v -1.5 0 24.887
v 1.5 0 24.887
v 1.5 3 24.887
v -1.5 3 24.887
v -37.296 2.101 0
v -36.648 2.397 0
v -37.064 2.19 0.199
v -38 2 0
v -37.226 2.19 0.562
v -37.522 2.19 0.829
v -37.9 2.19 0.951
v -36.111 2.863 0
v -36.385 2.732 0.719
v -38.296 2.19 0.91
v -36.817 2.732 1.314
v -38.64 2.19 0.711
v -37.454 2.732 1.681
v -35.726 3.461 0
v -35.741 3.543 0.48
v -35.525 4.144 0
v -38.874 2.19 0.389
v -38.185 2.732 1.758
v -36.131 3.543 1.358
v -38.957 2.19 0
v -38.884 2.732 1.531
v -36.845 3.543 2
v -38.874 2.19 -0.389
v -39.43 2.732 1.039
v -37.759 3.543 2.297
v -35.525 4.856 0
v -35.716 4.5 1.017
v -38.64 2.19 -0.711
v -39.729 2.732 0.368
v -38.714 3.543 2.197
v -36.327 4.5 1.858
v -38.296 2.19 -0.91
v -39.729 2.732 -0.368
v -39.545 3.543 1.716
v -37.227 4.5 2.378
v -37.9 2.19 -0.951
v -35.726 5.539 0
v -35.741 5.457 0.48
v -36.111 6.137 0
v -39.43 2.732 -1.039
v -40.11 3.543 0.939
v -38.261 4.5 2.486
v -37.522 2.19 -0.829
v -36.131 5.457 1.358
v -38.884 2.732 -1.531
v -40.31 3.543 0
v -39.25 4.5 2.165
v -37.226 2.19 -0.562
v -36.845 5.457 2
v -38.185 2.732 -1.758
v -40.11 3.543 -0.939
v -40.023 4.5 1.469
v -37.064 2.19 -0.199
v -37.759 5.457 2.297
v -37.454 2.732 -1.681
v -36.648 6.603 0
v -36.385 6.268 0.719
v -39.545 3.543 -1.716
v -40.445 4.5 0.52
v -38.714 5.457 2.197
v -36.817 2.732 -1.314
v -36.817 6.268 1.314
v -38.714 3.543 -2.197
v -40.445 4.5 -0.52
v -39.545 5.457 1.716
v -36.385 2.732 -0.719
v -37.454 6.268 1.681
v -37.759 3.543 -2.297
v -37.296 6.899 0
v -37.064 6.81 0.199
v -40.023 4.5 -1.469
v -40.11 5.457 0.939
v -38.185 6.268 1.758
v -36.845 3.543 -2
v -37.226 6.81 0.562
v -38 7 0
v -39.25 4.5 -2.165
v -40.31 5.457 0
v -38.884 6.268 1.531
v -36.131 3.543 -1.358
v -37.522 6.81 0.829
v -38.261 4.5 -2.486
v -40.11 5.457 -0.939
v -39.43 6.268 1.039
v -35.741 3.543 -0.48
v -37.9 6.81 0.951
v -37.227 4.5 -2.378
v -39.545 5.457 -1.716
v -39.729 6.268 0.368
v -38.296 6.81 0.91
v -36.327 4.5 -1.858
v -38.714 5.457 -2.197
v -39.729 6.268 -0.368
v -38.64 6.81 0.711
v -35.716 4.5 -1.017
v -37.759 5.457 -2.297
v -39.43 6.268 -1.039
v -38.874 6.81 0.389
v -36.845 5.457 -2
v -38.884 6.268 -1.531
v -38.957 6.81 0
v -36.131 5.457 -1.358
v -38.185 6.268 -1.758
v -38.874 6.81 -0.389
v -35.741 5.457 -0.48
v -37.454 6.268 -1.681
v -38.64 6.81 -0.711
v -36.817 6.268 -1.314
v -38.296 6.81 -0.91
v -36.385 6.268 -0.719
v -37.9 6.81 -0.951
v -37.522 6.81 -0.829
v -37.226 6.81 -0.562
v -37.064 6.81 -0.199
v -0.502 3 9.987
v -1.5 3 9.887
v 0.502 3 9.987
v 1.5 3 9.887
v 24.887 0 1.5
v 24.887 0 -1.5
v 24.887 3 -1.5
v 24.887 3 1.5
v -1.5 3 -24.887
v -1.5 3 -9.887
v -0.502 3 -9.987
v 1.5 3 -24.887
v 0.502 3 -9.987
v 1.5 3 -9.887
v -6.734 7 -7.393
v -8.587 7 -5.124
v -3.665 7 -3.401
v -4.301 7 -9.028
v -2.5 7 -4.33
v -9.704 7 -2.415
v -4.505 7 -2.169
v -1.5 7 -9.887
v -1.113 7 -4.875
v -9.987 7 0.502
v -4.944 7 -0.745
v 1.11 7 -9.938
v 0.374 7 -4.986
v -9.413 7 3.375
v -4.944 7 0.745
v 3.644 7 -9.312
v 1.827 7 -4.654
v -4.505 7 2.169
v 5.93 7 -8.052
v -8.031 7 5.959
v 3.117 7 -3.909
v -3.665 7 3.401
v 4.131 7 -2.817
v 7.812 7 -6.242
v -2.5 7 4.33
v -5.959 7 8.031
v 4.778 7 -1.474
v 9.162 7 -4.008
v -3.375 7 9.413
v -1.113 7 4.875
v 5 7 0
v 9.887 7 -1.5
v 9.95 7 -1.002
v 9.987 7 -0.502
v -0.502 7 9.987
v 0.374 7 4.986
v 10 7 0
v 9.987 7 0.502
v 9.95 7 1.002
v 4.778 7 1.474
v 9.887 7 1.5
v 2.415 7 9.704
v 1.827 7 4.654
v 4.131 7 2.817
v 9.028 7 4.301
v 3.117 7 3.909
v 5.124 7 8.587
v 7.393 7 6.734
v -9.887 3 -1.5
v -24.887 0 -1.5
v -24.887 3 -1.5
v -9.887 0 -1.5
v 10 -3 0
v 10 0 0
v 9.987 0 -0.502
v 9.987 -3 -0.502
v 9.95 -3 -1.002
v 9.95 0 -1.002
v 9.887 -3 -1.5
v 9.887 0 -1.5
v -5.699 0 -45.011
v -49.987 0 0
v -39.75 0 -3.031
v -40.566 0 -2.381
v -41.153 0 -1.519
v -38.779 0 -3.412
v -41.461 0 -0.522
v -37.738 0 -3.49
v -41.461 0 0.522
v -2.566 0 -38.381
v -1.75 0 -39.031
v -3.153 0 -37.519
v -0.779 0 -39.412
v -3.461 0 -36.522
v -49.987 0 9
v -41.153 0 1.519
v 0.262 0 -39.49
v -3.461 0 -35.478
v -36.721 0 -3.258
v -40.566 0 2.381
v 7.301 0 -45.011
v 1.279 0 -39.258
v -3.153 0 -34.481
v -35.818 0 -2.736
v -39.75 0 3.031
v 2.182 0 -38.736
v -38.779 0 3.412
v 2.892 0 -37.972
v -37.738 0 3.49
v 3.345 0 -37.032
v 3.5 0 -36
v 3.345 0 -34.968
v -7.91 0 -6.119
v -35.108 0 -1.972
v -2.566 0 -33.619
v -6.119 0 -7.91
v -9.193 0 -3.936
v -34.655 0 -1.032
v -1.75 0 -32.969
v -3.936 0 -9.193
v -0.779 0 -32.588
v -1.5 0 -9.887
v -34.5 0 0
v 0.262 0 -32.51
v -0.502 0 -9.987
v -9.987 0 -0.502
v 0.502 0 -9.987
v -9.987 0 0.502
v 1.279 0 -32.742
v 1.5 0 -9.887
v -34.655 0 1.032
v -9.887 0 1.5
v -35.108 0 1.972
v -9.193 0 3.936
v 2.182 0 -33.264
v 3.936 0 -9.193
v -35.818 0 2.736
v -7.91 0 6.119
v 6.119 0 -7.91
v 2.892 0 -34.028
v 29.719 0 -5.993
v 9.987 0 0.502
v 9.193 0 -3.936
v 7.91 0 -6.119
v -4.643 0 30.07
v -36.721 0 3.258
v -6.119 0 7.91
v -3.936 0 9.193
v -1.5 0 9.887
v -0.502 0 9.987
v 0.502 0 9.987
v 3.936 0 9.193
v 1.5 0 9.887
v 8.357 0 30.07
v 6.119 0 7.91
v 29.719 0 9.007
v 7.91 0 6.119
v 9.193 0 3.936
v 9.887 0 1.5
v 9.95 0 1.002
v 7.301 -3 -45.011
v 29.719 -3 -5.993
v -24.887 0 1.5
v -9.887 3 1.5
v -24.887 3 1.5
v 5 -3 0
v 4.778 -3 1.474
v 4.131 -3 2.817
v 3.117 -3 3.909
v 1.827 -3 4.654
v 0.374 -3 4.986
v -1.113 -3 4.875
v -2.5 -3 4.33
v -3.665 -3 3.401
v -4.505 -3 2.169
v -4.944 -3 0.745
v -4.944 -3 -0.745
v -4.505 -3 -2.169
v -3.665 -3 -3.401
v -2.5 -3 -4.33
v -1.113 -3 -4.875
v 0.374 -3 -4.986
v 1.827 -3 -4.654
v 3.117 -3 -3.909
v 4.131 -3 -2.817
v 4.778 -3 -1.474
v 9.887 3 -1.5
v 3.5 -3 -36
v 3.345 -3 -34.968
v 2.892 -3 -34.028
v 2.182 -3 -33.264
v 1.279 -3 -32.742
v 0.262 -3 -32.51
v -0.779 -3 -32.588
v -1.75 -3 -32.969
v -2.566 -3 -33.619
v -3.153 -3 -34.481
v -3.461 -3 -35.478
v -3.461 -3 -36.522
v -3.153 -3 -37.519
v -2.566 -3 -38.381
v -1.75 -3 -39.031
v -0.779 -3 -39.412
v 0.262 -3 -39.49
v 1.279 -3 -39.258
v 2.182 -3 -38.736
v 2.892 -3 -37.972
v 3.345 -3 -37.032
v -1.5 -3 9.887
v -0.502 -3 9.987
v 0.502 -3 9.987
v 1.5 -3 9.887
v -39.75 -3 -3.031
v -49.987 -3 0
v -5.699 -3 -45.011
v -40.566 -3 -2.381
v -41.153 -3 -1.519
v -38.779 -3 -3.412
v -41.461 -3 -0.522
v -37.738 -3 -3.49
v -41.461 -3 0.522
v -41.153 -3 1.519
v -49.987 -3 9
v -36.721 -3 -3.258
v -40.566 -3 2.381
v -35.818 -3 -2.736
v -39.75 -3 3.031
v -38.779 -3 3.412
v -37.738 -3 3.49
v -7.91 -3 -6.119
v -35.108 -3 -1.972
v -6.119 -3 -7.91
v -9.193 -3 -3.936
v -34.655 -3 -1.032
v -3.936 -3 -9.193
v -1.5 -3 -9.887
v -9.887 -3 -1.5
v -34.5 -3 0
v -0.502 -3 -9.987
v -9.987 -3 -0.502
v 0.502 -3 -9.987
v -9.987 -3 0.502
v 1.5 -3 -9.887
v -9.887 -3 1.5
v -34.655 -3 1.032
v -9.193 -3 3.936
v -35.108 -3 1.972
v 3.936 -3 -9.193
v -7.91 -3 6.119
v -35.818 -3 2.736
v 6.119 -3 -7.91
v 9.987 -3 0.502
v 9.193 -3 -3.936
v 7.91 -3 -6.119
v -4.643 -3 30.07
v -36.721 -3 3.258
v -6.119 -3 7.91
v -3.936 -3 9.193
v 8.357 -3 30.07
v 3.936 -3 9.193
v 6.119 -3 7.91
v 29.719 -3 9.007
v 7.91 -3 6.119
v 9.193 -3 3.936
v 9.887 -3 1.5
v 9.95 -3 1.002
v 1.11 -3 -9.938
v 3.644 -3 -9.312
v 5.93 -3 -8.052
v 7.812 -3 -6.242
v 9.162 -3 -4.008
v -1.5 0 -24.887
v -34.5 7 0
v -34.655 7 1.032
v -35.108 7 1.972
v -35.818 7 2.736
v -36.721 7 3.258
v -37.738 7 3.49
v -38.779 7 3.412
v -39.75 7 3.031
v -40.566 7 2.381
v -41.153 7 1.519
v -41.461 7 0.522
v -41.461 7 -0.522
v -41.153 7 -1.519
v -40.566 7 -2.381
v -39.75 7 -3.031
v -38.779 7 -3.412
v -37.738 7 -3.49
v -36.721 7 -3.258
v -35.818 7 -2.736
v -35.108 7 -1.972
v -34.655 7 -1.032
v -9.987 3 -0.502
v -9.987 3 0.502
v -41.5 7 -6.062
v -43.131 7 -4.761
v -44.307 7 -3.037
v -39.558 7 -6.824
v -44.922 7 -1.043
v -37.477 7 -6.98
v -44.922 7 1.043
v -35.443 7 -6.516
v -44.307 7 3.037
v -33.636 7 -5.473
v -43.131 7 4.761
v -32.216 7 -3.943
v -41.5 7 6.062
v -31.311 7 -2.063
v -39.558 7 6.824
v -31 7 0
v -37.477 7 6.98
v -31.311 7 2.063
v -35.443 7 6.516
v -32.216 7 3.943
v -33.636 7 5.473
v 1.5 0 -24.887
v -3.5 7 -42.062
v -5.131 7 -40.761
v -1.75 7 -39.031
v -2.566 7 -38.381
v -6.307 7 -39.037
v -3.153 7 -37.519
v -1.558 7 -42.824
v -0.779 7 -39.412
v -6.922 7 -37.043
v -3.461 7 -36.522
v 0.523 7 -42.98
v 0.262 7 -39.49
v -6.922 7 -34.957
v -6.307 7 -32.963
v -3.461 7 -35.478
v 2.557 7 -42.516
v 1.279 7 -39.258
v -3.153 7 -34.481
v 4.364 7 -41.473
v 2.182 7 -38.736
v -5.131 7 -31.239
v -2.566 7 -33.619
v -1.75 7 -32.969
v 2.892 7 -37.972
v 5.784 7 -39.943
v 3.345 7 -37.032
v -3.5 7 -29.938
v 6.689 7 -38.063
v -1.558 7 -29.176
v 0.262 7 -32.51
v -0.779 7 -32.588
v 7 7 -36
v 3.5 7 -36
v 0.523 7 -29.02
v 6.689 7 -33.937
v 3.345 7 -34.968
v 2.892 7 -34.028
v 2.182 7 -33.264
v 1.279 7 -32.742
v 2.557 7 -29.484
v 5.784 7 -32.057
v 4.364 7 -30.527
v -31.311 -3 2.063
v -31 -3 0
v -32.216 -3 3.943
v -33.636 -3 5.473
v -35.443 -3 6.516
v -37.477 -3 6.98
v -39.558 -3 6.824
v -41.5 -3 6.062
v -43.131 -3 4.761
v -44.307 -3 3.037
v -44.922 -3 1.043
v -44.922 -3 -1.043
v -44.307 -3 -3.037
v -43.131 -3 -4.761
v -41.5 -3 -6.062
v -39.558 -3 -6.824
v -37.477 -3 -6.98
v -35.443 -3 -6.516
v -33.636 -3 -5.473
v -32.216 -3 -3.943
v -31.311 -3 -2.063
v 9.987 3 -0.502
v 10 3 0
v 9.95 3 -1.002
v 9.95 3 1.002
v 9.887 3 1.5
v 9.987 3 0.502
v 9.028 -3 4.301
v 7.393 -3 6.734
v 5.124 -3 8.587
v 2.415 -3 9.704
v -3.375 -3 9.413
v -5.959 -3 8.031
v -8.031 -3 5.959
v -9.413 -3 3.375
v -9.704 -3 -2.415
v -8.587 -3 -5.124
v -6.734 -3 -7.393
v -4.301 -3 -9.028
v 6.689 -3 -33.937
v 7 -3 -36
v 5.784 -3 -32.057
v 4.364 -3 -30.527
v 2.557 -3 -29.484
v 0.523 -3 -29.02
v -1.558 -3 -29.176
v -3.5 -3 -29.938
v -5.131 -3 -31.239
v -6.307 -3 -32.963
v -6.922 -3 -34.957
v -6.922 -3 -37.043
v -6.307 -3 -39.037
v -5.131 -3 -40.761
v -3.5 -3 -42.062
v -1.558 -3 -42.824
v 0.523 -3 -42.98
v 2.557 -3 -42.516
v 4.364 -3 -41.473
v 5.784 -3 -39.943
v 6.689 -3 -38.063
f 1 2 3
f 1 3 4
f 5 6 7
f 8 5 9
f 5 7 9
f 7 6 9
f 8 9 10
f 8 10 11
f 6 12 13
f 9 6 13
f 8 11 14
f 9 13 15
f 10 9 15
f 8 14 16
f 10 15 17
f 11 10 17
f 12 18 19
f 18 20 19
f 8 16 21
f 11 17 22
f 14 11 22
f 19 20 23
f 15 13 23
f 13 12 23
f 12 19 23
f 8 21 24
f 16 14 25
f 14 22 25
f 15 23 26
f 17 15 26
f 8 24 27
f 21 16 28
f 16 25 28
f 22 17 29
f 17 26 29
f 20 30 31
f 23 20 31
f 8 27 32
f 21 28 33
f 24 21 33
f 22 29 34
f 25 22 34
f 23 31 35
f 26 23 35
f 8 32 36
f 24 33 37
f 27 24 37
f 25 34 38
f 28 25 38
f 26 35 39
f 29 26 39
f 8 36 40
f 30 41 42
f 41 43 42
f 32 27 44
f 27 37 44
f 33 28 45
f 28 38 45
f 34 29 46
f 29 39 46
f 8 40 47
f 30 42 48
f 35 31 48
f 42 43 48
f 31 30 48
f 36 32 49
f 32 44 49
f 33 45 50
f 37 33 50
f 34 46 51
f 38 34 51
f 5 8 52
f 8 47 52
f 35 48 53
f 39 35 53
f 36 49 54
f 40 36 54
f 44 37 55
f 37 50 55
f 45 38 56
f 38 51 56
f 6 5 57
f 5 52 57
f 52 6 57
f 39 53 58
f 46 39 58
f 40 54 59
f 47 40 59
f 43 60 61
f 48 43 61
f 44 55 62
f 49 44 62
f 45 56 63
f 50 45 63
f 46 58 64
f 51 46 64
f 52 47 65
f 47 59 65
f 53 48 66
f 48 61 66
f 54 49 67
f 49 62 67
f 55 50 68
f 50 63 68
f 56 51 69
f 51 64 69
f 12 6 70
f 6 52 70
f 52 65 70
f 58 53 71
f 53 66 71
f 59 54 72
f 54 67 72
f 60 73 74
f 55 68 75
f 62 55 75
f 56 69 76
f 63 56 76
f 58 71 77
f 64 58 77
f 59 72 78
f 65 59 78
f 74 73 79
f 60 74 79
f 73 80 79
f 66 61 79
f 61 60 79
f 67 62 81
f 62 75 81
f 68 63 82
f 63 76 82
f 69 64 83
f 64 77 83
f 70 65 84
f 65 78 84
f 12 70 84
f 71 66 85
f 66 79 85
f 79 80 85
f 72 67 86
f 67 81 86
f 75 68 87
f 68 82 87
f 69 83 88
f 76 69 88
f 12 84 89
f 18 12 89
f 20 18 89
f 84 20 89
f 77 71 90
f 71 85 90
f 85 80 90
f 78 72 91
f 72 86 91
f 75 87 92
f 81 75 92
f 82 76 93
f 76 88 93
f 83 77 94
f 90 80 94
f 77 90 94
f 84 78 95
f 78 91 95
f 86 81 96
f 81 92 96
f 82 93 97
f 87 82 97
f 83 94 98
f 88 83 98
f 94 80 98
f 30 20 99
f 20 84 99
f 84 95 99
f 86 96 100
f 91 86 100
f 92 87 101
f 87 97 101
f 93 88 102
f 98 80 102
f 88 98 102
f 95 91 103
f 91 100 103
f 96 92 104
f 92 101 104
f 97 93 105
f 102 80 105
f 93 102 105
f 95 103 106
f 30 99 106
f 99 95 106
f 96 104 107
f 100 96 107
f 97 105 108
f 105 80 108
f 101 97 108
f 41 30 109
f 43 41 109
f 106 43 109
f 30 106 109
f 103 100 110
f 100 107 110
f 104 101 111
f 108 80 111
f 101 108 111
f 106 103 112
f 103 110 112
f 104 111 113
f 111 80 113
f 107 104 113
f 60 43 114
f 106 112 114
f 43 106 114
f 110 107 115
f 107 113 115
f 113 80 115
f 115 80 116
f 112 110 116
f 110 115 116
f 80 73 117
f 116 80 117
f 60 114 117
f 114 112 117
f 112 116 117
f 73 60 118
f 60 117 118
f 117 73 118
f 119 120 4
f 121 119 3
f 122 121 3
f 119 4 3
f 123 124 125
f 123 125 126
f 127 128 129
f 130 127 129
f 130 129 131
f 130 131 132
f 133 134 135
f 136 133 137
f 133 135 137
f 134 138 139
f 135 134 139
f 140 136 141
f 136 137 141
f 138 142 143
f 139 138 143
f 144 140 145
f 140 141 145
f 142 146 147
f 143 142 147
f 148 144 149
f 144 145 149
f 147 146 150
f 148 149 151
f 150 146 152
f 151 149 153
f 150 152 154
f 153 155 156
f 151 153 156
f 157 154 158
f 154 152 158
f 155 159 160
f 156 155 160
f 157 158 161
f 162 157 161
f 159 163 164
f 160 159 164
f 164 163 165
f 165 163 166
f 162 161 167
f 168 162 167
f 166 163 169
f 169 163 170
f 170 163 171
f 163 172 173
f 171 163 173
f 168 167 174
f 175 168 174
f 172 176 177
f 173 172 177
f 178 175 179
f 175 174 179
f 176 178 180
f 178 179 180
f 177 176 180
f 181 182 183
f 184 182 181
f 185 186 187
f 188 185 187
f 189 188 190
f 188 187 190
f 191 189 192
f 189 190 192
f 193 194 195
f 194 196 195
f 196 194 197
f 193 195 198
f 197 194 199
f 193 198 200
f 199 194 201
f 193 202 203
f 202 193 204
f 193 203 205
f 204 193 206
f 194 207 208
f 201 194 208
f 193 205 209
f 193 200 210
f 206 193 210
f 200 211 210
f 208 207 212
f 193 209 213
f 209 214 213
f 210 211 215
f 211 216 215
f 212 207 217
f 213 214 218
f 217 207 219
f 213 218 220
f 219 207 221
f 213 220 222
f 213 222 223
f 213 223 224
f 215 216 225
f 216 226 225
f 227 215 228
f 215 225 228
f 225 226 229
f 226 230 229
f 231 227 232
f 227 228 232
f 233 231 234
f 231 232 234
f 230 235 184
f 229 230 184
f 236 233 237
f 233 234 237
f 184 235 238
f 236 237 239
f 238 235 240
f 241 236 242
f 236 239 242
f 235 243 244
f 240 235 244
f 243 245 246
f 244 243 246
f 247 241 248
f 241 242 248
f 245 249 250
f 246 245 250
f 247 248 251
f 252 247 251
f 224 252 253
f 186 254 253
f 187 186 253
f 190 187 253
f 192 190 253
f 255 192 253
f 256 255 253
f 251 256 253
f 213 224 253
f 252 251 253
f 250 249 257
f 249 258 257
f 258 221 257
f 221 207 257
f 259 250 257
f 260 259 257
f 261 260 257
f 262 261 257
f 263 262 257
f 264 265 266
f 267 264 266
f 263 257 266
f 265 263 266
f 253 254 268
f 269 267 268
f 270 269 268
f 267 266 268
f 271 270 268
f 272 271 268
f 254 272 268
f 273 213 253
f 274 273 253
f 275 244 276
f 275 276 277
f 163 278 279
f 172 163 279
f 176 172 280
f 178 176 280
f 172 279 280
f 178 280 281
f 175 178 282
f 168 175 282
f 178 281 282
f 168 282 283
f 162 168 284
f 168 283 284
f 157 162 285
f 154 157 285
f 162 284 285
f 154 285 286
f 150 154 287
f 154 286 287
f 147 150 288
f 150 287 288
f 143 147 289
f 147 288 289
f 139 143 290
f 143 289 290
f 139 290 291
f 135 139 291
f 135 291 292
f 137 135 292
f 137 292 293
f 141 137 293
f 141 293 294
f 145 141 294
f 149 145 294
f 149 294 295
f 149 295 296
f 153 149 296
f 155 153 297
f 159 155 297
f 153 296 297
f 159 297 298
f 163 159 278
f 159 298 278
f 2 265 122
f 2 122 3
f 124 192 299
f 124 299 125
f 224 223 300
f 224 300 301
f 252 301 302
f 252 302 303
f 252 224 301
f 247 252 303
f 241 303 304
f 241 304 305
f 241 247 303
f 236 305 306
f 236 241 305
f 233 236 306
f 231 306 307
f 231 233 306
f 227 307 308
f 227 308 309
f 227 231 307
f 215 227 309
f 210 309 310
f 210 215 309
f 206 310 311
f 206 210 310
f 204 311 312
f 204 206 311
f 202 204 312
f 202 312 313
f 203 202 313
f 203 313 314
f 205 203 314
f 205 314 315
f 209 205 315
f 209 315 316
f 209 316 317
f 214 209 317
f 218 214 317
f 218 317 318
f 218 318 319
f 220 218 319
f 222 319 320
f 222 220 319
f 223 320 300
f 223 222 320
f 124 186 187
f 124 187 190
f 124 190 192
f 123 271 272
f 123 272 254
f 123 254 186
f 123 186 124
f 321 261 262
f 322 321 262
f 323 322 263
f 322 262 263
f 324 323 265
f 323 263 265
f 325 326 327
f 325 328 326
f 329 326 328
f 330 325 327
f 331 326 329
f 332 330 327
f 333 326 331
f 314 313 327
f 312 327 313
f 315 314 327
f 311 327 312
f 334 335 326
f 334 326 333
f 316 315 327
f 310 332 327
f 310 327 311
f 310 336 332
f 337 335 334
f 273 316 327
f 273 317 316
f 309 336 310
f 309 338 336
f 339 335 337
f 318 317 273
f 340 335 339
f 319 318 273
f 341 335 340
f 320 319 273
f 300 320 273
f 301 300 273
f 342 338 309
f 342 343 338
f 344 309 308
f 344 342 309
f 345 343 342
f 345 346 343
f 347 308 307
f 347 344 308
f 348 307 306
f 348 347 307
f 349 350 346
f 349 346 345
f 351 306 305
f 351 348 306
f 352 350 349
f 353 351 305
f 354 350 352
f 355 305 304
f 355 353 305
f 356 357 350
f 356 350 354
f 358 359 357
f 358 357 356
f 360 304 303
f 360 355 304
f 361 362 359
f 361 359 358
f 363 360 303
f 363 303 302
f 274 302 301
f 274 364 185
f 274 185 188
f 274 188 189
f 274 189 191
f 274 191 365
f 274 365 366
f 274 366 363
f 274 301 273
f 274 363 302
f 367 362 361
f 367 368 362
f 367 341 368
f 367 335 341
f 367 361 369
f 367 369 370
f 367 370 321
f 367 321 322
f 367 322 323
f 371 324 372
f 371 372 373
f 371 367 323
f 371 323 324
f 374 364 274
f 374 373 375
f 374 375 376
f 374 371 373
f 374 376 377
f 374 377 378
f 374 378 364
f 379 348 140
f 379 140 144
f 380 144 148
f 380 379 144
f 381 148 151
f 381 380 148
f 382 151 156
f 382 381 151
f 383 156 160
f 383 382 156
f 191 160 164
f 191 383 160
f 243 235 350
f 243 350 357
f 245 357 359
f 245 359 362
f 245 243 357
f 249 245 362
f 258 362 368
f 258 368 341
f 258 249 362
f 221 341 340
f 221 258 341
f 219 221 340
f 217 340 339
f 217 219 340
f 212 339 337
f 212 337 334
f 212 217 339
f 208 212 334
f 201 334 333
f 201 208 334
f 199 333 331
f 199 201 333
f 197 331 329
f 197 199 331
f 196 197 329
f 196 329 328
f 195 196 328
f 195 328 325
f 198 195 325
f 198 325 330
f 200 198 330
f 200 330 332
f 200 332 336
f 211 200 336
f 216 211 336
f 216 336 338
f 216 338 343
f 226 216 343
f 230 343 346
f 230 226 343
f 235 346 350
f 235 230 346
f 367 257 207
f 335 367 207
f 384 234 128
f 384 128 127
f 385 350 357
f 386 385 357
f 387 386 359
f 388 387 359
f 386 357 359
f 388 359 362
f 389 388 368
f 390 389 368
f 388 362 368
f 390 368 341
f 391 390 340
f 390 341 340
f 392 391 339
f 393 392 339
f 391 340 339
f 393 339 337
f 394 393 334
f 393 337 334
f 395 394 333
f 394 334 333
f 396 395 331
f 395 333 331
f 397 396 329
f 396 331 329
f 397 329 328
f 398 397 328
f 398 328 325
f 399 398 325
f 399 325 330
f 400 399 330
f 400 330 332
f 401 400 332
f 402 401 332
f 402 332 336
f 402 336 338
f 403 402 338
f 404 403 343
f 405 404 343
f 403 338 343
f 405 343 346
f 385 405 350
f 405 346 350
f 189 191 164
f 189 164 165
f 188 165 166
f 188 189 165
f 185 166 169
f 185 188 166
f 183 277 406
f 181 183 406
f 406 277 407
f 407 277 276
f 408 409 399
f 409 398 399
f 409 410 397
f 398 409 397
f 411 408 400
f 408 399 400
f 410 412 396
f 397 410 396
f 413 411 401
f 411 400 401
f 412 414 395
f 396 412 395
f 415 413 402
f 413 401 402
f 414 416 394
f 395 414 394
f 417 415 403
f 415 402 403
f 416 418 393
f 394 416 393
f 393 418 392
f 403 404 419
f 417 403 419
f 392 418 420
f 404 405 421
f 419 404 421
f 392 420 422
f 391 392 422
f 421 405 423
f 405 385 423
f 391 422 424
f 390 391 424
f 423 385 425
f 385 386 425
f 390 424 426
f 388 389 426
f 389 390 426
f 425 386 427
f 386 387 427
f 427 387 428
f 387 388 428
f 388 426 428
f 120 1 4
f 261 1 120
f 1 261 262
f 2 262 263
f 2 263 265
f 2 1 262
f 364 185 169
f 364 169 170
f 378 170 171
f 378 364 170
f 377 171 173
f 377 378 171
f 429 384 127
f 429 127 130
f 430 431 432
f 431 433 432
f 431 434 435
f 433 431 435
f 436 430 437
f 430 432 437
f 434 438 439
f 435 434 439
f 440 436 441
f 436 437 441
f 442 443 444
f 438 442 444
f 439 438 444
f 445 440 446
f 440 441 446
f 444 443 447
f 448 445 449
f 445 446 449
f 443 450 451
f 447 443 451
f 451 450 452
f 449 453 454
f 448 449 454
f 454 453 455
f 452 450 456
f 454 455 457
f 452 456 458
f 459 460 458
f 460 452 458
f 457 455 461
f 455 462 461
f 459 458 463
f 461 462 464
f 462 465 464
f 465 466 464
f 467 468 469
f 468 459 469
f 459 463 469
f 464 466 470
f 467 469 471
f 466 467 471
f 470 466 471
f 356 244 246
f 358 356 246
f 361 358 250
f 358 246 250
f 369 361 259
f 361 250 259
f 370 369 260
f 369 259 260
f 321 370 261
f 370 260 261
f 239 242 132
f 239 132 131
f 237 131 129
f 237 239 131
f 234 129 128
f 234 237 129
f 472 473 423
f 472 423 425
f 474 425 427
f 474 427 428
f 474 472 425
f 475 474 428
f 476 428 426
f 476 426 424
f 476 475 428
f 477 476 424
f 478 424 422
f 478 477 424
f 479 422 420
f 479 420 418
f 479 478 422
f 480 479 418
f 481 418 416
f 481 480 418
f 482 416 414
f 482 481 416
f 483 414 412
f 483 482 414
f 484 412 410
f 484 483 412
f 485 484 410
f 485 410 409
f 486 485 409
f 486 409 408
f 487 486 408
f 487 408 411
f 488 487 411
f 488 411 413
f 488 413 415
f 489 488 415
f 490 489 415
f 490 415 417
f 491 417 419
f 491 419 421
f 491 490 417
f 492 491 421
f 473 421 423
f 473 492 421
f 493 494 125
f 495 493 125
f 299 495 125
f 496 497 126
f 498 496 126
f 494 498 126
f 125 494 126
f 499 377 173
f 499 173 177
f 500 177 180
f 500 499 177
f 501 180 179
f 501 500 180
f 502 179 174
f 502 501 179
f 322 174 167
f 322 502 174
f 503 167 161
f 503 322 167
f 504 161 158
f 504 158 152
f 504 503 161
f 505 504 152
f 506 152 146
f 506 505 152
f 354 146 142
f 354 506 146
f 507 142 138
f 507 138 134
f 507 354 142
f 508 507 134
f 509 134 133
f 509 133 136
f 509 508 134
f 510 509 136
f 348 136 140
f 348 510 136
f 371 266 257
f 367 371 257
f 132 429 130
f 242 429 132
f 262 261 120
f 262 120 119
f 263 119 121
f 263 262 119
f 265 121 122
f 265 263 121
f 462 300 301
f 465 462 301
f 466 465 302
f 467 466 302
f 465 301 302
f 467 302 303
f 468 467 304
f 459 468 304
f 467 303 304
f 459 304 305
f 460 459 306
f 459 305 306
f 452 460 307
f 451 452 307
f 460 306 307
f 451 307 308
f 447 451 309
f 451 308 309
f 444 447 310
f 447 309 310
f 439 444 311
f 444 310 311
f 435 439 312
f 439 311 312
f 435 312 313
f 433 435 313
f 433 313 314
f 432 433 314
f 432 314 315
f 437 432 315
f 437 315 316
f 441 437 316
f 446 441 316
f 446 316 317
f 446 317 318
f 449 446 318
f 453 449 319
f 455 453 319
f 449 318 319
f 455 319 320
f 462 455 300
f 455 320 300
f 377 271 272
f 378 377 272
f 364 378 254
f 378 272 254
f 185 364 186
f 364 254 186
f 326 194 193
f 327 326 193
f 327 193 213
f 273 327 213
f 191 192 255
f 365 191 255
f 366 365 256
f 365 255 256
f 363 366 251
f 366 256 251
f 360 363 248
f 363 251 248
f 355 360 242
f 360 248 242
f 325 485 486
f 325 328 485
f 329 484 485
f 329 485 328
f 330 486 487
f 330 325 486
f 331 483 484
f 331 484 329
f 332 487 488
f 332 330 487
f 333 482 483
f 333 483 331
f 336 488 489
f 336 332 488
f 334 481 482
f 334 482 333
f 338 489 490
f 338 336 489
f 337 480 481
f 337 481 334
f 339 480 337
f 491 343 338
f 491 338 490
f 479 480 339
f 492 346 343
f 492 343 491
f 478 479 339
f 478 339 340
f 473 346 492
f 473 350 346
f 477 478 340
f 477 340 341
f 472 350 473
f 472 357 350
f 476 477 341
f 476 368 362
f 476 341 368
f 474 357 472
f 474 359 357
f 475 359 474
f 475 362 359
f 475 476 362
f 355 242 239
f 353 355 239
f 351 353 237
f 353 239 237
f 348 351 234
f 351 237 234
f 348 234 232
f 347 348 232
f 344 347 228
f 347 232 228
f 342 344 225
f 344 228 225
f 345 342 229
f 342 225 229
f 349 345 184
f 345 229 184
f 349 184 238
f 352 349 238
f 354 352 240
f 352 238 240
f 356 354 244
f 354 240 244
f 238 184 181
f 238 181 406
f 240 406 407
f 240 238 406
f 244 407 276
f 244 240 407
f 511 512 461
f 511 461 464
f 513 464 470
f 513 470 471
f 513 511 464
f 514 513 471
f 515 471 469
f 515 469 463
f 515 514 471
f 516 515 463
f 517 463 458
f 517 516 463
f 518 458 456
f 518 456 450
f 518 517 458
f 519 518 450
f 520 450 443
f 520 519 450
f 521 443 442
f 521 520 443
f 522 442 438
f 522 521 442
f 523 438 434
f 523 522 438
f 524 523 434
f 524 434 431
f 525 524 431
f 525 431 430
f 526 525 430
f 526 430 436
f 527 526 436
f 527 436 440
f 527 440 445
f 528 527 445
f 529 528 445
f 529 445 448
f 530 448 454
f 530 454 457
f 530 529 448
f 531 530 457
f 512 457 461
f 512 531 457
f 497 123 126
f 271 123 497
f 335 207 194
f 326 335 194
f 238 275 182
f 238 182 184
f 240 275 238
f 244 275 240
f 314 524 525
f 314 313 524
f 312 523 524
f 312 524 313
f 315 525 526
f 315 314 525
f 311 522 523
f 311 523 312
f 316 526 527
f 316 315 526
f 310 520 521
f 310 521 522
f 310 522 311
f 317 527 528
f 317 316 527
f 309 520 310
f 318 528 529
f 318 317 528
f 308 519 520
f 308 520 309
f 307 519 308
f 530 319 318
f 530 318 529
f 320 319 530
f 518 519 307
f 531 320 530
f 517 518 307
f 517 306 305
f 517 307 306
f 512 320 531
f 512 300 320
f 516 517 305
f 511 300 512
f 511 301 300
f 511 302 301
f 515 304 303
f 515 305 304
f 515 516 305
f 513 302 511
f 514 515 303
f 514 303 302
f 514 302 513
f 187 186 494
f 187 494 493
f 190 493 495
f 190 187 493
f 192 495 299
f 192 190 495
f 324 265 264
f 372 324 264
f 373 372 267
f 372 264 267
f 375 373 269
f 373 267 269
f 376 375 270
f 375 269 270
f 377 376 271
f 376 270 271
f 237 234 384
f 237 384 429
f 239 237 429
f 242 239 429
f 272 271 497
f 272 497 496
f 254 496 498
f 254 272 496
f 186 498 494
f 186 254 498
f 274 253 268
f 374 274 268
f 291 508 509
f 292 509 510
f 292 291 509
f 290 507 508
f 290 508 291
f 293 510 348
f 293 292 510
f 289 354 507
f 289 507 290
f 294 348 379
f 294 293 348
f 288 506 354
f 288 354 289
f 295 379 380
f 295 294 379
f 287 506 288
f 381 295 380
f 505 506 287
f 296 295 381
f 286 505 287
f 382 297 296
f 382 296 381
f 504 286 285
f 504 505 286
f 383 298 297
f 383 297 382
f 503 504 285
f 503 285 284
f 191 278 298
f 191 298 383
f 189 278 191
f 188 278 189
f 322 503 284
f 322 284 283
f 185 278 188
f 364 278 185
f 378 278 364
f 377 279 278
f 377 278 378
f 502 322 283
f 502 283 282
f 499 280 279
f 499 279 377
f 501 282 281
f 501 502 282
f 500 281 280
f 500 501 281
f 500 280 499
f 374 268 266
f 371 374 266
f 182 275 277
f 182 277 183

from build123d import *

# Parameters (mm, degrees)
F1_DEPTH = 3
F0_R     = 3.5
F2_DEPTH = 3
F3_R     = 5
F3_R_2   = 7
F3_R_3   = 3.5
F4_DEPTH = 10


with BuildPart() as f1:
    # F0 (on Front) → F1 (new body)
    with BuildSketch(Plane.XZ):
        with BuildLine():
            ThreePointArc((-9.88686, -1.5), (-10, 0), (-9.88686, 1.5))
            Line((-9.88686, 1.5), (-24.88686, 1.5))
            Line((-24.88686, 1.5), (-24.88686, -1.5))
            Line((-24.88686, -1.5), (-9.88686, -1.5))
        make_face()
        with BuildLine():
            ThreePointArc((-1.5, 9.88686), (0, 10), (1.5, 9.88686))
            Line((1.5, 9.88686), (1.5, 24.88686))
            Line((1.5, 24.88686), (-1.5, 24.88686))
            Line((-1.5, 24.88686), (-1.5, 9.88686))
        make_face()
        with BuildLine():
            ThreePointArc((9.88686, 1.5), (9.971675, 0.75213), (10, 0))
            ThreePointArc((10, 0), (9.971675, -0.75213), (9.88686, -1.5))
            Line((9.88686, -1.5), (24.88686, -1.5))
            Line((24.88686, -1.5), (24.88686, 1.5))
            Line((24.88686, 1.5), (9.88686, 1.5))
        make_face()
        with BuildLine():
            Line((1.5, -24.88686), (1.5, -9.88686))
            ThreePointArc((1.5, -9.88686), (0, -10), (-1.5, -9.88686))
            Line((-1.5, -9.88686), (-1.5, -24.88686))
            Line((-1.5, -24.88686), (1.5, -24.88686))
        make_face()
    extrude(amount=-F1_DEPTH)


with BuildPart() as f2:
    # F0 (on Front) → F2 (new body)
    with BuildSketch(Plane.XZ):
        Polygon((-49.986798, 9), (-49.986798, 0), (-5.699021, -45.011338), (7.300979, -45.011338), (29.718812, -5.99287), (29.718812, 2.802204), (29.718812, 9.00713), (8.356749, 30.070422), (-4.643251, 30.070422), align=None)
        with Locations((0, -36)):
            Circle(F0_R, mode=Mode.SUBTRACT)
        with Locations((-38, 0)):
            Circle(F0_R, mode=Mode.SUBTRACT)
        with BuildLine():
            ThreePointArc((1.5, 9.88686), (7.071068, 7.071068), (9.88686, 1.5))
            Line((9.88686, 1.5), (24.88686, 1.5))
            Line((24.88686, 1.5), (24.88686, -1.5))
            Line((24.88686, -1.5), (9.88686, -1.5))
            ThreePointArc((9.88686, -1.5), (7.071068, -7.071068), (1.5, -9.88686))
            Line((1.5, -9.88686), (1.5, -24.88686))
            Line((1.5, -24.88686), (-1.5, -24.88686))
            Line((-1.5, -24.88686), (-1.5, -9.88686))
            ThreePointArc((-1.5, -9.88686), (-7.071068, -7.071068), (-9.88686, -1.5))
            Line((-9.88686, -1.5), (-24.88686, -1.5))
            Line((-24.88686, -1.5), (-24.88686, 1.5))
            Line((-24.88686, 1.5), (-9.88686, 1.5))
            ThreePointArc((-9.88686, 1.5), (-7.071068, 7.071068), (-1.5, 9.88686))
            Line((-1.5, 9.88686), (-1.5, 24.88686))
            Line((-1.5, 24.88686), (1.5, 24.88686))
            Line((1.5, 24.88686), (1.5, 9.88686))
        make_face(mode=Mode.SUBTRACT)
        with BuildLine():
            ThreePointArc((-9.88686, -1.5), (-10, 0), (-9.88686, 1.5))
            Line((-9.88686, 1.5), (-24.88686, 1.5))
            Line((-24.88686, 1.5), (-24.88686, -1.5))
            Line((-24.88686, -1.5), (-9.88686, -1.5))
        make_face()
        with BuildLine():
            ThreePointArc((-1.5, 9.88686), (0, 10), (1.5, 9.88686))
            Line((1.5, 9.88686), (1.5, 24.88686))
            Line((1.5, 24.88686), (-1.5, 24.88686))
            Line((-1.5, 24.88686), (-1.5, 9.88686))
        make_face()
        with BuildLine():
            ThreePointArc((9.88686, 1.5), (9.971675, 0.75213), (10, 0))
            ThreePointArc((10, 0), (9.971675, -0.75213), (9.88686, -1.5))
            Line((9.88686, -1.5), (24.88686, -1.5))
            Line((24.88686, -1.5), (24.88686, 1.5))
            Line((24.88686, 1.5), (9.88686, 1.5))
        make_face()
        with BuildLine():
            Line((1.5, -24.88686), (1.5, -9.88686))
            ThreePointArc((1.5, -9.88686), (0, -10), (-1.5, -9.88686))
            Line((-1.5, -9.88686), (-1.5, -24.88686))
            Line((-1.5, -24.88686), (1.5, -24.88686))
        make_face()
    extrude(amount=F2_DEPTH)


with BuildPart() as f4:
    # F3 (on face) → F4 (new body)
    with BuildSketch(Plane.XZ.offset(3)):
        with BuildLine():
            ThreePointArc((9.88686, -1.5), (9.971675, -0.75213), (10, 0))
            ThreePointArc((10, 0), (9.971675, 0.75213), (9.88686, 1.5))
            ThreePointArc((9.88686, 1.5), (-7.071068, 7.071068), (-1.5, -9.88686))
            ThreePointArc((-1.5, -9.88686), (5.930406, -8.051726), (9.88686, -1.5))
        make_face()
        Circle(F3_R, mode=Mode.SUBTRACT)
        with Locations((0, -36)):
            Circle(F3_R_2)
        with Locations((0, -36)):
            Circle(F3_R_3, mode=Mode.SUBTRACT)
        with Locations((-38, 0)):
            Circle(F3_R_2)
        with Locations((-38, 0)):
            Circle(F3_R_3, mode=Mode.SUBTRACT)
    extrude(amount=-F4_DEPTH)


with BuildPart() as f6:
    # F5 (on Top) → F6 (revolve)
    with BuildSketch(Plane.XY):
        with BuildLine():
            ThreePointArc((-38, 2), (-35.5, 4.5), (-38, 7))
            Line((-38, 7), (-38, 2))
        make_face()
    revolve(axis=Axis((-38, 4.5, 0), (0, -1, 0)))


solid = Compound([f1.part, f2.part, f4.part, f6.part])
